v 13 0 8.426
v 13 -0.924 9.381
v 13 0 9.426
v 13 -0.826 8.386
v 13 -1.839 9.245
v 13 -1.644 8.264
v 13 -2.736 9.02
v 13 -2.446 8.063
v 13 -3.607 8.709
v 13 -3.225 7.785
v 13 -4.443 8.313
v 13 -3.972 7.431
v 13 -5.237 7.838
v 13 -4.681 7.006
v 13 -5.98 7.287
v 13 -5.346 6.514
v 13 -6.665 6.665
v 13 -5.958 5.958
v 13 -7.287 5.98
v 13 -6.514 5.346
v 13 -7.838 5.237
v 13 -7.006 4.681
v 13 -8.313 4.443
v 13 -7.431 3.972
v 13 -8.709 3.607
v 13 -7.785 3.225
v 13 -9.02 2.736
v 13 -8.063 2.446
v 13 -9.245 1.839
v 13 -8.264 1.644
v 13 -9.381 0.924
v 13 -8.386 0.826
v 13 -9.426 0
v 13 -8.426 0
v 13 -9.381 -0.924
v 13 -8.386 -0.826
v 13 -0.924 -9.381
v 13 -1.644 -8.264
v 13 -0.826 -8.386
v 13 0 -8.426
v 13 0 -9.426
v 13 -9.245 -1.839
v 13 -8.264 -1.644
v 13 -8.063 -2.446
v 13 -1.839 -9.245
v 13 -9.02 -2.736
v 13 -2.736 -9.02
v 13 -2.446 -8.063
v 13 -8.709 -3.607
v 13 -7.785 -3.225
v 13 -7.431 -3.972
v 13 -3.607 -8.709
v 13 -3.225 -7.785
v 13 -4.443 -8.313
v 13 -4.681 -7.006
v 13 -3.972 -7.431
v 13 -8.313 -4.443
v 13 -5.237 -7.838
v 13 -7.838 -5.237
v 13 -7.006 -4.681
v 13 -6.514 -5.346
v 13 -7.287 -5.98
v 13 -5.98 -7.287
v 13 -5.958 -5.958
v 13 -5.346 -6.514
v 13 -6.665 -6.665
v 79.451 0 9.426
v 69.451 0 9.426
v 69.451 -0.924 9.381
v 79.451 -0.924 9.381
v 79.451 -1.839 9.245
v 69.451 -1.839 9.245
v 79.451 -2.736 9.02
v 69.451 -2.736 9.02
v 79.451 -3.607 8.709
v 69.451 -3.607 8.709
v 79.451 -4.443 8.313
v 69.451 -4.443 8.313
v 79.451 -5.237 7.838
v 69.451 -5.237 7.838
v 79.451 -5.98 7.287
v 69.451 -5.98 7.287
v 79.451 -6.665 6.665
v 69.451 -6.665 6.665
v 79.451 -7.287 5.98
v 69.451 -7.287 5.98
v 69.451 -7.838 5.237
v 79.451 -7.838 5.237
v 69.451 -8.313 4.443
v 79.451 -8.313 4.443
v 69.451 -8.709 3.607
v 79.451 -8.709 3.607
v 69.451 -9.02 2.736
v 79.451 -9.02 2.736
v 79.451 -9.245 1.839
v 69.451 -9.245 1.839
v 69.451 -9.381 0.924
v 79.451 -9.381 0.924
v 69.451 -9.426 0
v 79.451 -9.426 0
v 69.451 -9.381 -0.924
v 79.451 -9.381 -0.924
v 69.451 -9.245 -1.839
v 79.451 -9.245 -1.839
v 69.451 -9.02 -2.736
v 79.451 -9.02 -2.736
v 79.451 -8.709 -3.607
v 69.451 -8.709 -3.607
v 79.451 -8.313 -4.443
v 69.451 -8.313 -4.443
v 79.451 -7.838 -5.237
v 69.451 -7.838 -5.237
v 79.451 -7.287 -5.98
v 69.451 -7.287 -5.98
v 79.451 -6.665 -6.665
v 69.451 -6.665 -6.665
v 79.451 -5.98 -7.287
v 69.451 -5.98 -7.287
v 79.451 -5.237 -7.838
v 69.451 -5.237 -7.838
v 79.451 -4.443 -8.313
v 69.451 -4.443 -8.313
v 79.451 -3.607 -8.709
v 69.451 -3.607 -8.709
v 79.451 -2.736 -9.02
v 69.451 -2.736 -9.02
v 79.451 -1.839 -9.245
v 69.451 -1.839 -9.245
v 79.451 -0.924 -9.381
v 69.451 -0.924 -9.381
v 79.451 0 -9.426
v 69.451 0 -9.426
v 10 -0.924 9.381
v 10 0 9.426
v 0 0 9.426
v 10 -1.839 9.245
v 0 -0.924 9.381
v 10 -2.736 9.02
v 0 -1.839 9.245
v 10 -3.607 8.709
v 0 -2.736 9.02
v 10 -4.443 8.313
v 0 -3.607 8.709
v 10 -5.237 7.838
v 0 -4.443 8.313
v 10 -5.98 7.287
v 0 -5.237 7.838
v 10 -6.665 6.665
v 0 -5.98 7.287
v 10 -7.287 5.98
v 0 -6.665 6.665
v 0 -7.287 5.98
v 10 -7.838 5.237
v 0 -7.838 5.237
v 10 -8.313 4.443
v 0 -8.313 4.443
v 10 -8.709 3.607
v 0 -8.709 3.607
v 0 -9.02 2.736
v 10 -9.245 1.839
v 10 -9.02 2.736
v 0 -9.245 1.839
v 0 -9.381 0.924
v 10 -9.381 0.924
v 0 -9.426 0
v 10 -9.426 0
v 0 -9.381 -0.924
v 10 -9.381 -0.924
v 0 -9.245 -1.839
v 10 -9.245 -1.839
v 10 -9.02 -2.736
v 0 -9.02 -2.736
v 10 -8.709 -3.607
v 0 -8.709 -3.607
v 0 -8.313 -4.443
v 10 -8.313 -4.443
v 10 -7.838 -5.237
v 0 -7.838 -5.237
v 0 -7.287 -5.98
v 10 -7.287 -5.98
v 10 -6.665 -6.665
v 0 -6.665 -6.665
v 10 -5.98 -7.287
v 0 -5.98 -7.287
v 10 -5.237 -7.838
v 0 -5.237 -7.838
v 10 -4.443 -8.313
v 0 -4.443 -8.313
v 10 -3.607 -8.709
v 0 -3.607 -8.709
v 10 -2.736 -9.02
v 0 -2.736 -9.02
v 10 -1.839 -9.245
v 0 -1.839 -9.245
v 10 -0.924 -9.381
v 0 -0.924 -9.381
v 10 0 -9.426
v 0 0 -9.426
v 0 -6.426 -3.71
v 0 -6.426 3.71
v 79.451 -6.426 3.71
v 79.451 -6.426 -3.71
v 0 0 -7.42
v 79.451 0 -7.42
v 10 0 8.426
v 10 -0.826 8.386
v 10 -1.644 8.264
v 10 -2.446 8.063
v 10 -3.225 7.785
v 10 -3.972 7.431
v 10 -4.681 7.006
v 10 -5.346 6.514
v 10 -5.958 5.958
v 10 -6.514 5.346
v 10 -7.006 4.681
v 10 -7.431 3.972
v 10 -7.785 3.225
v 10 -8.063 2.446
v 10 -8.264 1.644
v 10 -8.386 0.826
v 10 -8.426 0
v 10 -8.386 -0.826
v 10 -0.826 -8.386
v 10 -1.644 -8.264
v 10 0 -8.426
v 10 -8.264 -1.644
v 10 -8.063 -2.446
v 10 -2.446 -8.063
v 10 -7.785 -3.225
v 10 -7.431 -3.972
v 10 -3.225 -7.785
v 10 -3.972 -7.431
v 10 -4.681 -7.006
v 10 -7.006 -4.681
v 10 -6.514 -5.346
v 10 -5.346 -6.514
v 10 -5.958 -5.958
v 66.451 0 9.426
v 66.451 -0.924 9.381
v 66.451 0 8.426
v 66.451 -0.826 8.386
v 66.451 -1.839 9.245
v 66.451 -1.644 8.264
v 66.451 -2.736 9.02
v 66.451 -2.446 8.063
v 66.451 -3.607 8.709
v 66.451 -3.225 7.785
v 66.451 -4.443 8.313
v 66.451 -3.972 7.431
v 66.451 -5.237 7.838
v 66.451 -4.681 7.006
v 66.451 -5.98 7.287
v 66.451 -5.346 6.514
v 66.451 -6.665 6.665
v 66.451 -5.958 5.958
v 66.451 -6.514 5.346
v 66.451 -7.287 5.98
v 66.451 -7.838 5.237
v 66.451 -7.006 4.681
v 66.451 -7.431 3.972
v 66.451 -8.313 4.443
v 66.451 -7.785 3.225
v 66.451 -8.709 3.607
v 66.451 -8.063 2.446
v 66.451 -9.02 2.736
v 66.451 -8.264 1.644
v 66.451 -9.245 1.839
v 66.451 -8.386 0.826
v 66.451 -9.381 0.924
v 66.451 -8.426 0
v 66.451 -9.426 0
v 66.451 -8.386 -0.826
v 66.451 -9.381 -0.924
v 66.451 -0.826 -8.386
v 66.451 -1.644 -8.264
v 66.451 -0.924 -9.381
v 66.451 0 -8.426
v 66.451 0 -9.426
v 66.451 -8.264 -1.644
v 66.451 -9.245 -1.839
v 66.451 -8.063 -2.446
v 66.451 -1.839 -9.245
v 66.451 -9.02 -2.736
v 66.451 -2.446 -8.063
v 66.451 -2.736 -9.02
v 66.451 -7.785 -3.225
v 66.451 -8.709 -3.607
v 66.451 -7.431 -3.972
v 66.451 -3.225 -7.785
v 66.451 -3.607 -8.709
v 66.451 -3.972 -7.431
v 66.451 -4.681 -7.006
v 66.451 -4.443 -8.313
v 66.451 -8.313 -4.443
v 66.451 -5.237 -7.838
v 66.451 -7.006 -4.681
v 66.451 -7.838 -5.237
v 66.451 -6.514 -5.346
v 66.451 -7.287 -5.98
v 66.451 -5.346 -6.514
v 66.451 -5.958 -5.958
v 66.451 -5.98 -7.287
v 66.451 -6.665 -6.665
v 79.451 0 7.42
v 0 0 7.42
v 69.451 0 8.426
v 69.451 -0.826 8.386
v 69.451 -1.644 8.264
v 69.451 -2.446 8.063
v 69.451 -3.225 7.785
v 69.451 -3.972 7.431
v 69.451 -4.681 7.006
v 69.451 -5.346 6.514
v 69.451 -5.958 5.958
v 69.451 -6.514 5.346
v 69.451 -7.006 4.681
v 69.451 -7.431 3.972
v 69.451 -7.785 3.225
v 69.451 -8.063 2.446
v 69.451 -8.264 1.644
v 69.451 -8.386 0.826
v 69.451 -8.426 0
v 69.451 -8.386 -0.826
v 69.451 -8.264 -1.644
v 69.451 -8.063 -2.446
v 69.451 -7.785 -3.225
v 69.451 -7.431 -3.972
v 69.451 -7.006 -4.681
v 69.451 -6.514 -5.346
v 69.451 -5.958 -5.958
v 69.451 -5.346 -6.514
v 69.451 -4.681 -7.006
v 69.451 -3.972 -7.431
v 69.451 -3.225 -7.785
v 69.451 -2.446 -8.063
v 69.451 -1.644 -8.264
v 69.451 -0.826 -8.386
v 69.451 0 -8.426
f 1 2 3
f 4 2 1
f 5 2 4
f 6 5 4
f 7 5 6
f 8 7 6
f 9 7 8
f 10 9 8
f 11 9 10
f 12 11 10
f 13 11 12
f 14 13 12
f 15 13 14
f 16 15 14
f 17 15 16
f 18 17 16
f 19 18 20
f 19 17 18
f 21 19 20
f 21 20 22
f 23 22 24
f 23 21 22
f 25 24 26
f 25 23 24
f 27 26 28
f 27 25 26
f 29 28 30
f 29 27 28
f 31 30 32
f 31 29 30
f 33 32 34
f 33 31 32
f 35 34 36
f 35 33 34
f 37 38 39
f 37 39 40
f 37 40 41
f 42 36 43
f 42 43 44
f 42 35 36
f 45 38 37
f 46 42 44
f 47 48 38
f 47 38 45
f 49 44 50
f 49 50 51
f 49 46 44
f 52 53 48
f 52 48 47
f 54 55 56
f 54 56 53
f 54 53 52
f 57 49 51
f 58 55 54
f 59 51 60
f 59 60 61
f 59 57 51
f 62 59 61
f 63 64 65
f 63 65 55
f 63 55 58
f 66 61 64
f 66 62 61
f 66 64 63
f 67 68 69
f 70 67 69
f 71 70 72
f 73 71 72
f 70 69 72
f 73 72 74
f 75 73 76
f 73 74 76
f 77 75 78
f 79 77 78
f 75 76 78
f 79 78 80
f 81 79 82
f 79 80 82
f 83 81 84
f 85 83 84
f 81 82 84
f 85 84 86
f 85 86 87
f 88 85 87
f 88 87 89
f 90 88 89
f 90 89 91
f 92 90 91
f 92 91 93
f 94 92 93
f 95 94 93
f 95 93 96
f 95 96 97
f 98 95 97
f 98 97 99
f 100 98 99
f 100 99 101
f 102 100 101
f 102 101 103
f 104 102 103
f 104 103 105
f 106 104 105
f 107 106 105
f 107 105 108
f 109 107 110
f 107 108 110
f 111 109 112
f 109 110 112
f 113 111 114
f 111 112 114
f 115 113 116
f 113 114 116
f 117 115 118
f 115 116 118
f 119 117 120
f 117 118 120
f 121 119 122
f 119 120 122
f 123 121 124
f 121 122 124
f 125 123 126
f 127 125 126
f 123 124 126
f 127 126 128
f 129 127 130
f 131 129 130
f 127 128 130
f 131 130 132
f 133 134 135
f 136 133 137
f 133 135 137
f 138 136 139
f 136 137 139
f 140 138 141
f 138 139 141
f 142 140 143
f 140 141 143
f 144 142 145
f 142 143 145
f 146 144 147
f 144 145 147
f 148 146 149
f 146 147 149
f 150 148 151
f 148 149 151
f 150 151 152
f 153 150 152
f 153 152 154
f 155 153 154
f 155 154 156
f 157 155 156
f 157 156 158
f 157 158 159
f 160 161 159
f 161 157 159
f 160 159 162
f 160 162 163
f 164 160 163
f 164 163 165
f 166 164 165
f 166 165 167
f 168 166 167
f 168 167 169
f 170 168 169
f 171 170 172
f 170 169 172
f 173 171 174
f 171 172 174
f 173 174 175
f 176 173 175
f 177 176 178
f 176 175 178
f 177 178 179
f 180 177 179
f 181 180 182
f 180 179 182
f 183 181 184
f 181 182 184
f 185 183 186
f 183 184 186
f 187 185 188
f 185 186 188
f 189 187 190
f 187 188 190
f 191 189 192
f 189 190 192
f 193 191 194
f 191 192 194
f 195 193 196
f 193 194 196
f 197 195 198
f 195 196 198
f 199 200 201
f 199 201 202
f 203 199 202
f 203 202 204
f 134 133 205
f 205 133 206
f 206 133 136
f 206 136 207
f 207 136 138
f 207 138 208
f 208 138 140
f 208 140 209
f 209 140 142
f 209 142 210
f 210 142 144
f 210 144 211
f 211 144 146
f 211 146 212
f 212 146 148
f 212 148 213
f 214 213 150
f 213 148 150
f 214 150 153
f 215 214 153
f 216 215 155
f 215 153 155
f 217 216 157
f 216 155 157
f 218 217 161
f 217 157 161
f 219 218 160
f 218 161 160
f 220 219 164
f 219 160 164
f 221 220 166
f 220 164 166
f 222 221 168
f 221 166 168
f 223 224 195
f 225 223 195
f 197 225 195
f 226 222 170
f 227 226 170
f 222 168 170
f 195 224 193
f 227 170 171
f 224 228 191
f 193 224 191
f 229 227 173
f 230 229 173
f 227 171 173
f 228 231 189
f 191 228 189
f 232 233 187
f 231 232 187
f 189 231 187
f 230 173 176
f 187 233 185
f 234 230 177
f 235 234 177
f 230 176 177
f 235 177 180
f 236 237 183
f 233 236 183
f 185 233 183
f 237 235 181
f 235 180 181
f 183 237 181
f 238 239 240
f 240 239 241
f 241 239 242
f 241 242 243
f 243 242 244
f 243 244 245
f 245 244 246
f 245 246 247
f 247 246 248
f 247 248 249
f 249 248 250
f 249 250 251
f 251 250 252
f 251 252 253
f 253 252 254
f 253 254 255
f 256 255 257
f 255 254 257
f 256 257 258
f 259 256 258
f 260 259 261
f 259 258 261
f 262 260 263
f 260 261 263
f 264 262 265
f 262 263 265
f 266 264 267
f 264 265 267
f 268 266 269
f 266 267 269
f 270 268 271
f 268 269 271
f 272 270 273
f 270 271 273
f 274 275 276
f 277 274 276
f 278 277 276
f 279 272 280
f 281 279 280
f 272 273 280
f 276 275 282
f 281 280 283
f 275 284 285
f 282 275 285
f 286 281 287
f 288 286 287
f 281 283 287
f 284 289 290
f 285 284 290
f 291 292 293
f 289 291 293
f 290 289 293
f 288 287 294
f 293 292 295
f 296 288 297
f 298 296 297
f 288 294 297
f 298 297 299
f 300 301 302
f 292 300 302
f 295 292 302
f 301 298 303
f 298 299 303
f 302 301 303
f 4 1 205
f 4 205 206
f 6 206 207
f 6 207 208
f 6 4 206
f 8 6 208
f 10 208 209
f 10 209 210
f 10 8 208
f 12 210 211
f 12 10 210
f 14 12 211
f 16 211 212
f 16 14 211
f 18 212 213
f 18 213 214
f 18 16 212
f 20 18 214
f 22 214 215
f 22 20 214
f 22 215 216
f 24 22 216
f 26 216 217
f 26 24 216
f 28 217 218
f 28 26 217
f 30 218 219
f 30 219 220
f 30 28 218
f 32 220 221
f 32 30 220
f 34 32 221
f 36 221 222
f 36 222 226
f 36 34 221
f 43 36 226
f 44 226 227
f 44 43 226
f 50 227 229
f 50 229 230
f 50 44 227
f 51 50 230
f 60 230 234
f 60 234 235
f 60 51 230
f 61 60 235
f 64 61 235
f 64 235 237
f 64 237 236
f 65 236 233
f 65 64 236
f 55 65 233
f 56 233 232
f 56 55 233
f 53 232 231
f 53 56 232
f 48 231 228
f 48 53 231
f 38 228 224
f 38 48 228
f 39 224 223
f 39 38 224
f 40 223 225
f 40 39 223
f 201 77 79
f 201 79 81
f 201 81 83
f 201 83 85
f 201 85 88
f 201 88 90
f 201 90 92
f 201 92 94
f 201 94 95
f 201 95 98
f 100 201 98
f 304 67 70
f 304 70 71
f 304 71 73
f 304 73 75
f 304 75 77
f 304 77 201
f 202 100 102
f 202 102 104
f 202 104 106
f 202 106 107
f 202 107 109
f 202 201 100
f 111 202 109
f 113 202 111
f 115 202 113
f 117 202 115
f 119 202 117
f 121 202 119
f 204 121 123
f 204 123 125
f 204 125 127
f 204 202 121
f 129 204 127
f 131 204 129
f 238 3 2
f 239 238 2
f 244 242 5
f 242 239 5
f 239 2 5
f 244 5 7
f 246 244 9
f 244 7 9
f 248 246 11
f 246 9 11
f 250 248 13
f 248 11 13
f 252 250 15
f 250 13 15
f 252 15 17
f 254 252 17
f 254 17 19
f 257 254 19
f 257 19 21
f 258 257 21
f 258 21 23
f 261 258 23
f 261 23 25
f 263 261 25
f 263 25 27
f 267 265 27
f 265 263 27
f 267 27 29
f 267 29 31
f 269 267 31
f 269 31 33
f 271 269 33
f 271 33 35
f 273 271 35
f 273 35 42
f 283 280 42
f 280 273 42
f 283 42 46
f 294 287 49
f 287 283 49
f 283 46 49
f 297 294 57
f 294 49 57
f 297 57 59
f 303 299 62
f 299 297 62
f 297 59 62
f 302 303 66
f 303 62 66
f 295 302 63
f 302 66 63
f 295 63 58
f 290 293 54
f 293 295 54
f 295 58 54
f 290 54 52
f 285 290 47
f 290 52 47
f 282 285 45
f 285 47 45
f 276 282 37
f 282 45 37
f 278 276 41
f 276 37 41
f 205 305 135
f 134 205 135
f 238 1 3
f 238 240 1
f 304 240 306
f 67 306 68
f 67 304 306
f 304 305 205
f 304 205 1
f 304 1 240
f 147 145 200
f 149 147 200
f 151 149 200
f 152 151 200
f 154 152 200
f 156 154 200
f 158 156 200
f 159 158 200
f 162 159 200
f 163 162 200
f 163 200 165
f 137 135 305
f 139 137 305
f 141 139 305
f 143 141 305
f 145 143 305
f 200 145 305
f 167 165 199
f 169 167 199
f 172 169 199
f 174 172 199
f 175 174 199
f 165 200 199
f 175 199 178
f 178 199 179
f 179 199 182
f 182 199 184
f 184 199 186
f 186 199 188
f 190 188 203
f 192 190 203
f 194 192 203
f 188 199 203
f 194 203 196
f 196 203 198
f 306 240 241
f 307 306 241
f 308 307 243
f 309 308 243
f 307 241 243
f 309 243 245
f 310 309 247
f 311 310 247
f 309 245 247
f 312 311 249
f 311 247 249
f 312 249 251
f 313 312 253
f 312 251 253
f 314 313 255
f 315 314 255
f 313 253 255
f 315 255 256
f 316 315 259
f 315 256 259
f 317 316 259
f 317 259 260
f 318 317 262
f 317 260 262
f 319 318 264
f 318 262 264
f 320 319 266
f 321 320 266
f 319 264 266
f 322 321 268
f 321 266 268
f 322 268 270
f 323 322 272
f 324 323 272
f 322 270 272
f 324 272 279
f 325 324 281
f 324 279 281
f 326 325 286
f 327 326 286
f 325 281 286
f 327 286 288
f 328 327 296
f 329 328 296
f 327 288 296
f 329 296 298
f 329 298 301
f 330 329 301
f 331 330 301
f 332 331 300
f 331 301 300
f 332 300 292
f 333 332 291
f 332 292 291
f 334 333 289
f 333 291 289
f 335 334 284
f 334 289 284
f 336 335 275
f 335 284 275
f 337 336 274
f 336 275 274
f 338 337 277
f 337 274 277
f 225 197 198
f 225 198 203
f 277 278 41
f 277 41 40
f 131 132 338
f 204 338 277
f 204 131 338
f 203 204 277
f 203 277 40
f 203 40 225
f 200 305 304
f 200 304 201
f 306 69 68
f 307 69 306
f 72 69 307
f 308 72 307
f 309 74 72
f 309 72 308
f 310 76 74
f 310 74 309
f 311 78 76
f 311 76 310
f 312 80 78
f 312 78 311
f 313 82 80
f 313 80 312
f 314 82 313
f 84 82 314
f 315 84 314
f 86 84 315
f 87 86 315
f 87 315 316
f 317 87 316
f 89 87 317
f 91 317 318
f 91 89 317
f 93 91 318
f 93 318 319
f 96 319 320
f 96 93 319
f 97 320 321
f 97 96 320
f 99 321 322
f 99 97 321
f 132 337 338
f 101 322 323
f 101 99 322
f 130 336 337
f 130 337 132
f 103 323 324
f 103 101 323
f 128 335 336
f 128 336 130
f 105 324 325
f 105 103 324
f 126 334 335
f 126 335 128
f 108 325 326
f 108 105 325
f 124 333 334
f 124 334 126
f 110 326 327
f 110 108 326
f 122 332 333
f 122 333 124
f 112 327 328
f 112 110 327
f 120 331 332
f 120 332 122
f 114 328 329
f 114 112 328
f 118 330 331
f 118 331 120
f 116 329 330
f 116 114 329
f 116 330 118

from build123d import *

# Parameters (mm, degrees)
SKETCH1_R           = 9.4262
BOSS_EXTRUDE1_DEPTH = 79.4512
SKETCH2_W           = 3
SKETCH2_H           = 1


with BuildPart() as part:
    # Sketch1 → Boss-Extrude1 (new body)
    with BuildSketch(Plane(origin=(0, 0, 0), x_dir=(0, 0, -1), z_dir=(1, 0, 0))):
        Circle(SKETCH1_R)
        Polygon((7.4203366, 0), (3.7101683, 6.4262), (-3.7101683, 6.4262), (-7.4203366, 0), (-3.7101683, -6.4262), (3.7101683, -6.4262), align=None, mode=Mode.SUBTRACT)
    extrude(amount=BOSS_EXTRUDE1_DEPTH)

    # Sketch2 → Cut-Revolve1 (revolve, cut)
    with BuildSketch(Plane.XY, mode=Mode.PRIVATE) as cut_revolve1_sk:
        with Locations((11.5, 8.9262)):
            Rectangle(SKETCH2_W, SKETCH2_H)
    cut_revolve1 = revolve(cut_revolve1_sk.sketch.rotate(Axis((-1.5494, 0, 0), (1, 0, 0)), 90), axis=Axis((-1.5494, 0, 0), (1, 0, 0)), mode=Mode.SUBTRACT)

    # Mirror1: Cut-Revolve1 across plane
    add(cut_revolve1.mirror(Plane.ZY.offset(-39.7256)), mode=Mode.SUBTRACT)

    # Split1
    split(bisect_by=Plane.ZX, keep=Keep.BOTTOM)


solid = part.part
